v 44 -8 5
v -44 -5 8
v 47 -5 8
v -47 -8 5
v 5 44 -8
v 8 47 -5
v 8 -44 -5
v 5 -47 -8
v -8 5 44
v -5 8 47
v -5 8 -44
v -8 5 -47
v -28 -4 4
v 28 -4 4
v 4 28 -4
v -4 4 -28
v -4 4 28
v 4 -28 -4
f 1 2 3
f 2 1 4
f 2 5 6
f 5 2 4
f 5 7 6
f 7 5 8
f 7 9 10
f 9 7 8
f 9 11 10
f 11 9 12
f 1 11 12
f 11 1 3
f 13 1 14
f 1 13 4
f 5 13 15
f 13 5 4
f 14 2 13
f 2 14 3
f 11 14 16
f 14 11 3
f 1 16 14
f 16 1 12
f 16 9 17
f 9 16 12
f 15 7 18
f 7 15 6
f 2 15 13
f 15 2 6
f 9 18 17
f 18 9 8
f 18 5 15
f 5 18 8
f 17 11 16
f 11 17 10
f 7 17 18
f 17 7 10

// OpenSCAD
// Knotted Dodecahedron
//   coords via: http://dmccooey.com/polyhedra/KnottedDodecahedron.html
//
scaling_factor = 1;

vertices = [
  [-47.0,  -8.0,   5.0], [  5.0, -47.0,  -8.0], [ -8.0,   5.0, -47.0], 
  [ 47.0,  -5.0,   8.0], [  8.0,  47.0,  -5.0], [ -5.0,   8.0,  47.0], 
  [ 44.0,  -8.0,   5.0], [  5.0,  44.0,  -8.0], [ -8.0,   5.0,  44.0], 
  [-44.0,  -5.0,   8.0], [  8.0, -44.0,  -5.0], [ -5.0,   8.0, -44.0], 
  [ 28.0,  -4.0,   4.0], [-28.0,  -4.0,   4.0], [  4.0,  28.0,  -4.0], 
  [  4.0, -28.0,  -4.0], [ -4.0,   4.0,  28.0], [ -4.0,   4.0, -28.0]
];

faces = [
  [ 0,  6,  3,  9], [ 0,  9,  4,  7],
  [ 1,  7,  4, 10], [ 1, 10,  5,  8],
  [ 2,  8,  5, 11], [ 2, 11,  3,  6],
  [12,  6,  0,  7, 14, 13], [12, 13,  9,  3, 11, 17], [12, 17, 16,  8,  2,  6],
  [15, 10,  4,  9, 13, 14], [15, 14,  7,  1,  8, 16], [15, 16, 17, 11,  5, 10]
];

scale(scaling_factor) {
  polyhedron(points=vertices, faces=faces, convexity=20);
}
